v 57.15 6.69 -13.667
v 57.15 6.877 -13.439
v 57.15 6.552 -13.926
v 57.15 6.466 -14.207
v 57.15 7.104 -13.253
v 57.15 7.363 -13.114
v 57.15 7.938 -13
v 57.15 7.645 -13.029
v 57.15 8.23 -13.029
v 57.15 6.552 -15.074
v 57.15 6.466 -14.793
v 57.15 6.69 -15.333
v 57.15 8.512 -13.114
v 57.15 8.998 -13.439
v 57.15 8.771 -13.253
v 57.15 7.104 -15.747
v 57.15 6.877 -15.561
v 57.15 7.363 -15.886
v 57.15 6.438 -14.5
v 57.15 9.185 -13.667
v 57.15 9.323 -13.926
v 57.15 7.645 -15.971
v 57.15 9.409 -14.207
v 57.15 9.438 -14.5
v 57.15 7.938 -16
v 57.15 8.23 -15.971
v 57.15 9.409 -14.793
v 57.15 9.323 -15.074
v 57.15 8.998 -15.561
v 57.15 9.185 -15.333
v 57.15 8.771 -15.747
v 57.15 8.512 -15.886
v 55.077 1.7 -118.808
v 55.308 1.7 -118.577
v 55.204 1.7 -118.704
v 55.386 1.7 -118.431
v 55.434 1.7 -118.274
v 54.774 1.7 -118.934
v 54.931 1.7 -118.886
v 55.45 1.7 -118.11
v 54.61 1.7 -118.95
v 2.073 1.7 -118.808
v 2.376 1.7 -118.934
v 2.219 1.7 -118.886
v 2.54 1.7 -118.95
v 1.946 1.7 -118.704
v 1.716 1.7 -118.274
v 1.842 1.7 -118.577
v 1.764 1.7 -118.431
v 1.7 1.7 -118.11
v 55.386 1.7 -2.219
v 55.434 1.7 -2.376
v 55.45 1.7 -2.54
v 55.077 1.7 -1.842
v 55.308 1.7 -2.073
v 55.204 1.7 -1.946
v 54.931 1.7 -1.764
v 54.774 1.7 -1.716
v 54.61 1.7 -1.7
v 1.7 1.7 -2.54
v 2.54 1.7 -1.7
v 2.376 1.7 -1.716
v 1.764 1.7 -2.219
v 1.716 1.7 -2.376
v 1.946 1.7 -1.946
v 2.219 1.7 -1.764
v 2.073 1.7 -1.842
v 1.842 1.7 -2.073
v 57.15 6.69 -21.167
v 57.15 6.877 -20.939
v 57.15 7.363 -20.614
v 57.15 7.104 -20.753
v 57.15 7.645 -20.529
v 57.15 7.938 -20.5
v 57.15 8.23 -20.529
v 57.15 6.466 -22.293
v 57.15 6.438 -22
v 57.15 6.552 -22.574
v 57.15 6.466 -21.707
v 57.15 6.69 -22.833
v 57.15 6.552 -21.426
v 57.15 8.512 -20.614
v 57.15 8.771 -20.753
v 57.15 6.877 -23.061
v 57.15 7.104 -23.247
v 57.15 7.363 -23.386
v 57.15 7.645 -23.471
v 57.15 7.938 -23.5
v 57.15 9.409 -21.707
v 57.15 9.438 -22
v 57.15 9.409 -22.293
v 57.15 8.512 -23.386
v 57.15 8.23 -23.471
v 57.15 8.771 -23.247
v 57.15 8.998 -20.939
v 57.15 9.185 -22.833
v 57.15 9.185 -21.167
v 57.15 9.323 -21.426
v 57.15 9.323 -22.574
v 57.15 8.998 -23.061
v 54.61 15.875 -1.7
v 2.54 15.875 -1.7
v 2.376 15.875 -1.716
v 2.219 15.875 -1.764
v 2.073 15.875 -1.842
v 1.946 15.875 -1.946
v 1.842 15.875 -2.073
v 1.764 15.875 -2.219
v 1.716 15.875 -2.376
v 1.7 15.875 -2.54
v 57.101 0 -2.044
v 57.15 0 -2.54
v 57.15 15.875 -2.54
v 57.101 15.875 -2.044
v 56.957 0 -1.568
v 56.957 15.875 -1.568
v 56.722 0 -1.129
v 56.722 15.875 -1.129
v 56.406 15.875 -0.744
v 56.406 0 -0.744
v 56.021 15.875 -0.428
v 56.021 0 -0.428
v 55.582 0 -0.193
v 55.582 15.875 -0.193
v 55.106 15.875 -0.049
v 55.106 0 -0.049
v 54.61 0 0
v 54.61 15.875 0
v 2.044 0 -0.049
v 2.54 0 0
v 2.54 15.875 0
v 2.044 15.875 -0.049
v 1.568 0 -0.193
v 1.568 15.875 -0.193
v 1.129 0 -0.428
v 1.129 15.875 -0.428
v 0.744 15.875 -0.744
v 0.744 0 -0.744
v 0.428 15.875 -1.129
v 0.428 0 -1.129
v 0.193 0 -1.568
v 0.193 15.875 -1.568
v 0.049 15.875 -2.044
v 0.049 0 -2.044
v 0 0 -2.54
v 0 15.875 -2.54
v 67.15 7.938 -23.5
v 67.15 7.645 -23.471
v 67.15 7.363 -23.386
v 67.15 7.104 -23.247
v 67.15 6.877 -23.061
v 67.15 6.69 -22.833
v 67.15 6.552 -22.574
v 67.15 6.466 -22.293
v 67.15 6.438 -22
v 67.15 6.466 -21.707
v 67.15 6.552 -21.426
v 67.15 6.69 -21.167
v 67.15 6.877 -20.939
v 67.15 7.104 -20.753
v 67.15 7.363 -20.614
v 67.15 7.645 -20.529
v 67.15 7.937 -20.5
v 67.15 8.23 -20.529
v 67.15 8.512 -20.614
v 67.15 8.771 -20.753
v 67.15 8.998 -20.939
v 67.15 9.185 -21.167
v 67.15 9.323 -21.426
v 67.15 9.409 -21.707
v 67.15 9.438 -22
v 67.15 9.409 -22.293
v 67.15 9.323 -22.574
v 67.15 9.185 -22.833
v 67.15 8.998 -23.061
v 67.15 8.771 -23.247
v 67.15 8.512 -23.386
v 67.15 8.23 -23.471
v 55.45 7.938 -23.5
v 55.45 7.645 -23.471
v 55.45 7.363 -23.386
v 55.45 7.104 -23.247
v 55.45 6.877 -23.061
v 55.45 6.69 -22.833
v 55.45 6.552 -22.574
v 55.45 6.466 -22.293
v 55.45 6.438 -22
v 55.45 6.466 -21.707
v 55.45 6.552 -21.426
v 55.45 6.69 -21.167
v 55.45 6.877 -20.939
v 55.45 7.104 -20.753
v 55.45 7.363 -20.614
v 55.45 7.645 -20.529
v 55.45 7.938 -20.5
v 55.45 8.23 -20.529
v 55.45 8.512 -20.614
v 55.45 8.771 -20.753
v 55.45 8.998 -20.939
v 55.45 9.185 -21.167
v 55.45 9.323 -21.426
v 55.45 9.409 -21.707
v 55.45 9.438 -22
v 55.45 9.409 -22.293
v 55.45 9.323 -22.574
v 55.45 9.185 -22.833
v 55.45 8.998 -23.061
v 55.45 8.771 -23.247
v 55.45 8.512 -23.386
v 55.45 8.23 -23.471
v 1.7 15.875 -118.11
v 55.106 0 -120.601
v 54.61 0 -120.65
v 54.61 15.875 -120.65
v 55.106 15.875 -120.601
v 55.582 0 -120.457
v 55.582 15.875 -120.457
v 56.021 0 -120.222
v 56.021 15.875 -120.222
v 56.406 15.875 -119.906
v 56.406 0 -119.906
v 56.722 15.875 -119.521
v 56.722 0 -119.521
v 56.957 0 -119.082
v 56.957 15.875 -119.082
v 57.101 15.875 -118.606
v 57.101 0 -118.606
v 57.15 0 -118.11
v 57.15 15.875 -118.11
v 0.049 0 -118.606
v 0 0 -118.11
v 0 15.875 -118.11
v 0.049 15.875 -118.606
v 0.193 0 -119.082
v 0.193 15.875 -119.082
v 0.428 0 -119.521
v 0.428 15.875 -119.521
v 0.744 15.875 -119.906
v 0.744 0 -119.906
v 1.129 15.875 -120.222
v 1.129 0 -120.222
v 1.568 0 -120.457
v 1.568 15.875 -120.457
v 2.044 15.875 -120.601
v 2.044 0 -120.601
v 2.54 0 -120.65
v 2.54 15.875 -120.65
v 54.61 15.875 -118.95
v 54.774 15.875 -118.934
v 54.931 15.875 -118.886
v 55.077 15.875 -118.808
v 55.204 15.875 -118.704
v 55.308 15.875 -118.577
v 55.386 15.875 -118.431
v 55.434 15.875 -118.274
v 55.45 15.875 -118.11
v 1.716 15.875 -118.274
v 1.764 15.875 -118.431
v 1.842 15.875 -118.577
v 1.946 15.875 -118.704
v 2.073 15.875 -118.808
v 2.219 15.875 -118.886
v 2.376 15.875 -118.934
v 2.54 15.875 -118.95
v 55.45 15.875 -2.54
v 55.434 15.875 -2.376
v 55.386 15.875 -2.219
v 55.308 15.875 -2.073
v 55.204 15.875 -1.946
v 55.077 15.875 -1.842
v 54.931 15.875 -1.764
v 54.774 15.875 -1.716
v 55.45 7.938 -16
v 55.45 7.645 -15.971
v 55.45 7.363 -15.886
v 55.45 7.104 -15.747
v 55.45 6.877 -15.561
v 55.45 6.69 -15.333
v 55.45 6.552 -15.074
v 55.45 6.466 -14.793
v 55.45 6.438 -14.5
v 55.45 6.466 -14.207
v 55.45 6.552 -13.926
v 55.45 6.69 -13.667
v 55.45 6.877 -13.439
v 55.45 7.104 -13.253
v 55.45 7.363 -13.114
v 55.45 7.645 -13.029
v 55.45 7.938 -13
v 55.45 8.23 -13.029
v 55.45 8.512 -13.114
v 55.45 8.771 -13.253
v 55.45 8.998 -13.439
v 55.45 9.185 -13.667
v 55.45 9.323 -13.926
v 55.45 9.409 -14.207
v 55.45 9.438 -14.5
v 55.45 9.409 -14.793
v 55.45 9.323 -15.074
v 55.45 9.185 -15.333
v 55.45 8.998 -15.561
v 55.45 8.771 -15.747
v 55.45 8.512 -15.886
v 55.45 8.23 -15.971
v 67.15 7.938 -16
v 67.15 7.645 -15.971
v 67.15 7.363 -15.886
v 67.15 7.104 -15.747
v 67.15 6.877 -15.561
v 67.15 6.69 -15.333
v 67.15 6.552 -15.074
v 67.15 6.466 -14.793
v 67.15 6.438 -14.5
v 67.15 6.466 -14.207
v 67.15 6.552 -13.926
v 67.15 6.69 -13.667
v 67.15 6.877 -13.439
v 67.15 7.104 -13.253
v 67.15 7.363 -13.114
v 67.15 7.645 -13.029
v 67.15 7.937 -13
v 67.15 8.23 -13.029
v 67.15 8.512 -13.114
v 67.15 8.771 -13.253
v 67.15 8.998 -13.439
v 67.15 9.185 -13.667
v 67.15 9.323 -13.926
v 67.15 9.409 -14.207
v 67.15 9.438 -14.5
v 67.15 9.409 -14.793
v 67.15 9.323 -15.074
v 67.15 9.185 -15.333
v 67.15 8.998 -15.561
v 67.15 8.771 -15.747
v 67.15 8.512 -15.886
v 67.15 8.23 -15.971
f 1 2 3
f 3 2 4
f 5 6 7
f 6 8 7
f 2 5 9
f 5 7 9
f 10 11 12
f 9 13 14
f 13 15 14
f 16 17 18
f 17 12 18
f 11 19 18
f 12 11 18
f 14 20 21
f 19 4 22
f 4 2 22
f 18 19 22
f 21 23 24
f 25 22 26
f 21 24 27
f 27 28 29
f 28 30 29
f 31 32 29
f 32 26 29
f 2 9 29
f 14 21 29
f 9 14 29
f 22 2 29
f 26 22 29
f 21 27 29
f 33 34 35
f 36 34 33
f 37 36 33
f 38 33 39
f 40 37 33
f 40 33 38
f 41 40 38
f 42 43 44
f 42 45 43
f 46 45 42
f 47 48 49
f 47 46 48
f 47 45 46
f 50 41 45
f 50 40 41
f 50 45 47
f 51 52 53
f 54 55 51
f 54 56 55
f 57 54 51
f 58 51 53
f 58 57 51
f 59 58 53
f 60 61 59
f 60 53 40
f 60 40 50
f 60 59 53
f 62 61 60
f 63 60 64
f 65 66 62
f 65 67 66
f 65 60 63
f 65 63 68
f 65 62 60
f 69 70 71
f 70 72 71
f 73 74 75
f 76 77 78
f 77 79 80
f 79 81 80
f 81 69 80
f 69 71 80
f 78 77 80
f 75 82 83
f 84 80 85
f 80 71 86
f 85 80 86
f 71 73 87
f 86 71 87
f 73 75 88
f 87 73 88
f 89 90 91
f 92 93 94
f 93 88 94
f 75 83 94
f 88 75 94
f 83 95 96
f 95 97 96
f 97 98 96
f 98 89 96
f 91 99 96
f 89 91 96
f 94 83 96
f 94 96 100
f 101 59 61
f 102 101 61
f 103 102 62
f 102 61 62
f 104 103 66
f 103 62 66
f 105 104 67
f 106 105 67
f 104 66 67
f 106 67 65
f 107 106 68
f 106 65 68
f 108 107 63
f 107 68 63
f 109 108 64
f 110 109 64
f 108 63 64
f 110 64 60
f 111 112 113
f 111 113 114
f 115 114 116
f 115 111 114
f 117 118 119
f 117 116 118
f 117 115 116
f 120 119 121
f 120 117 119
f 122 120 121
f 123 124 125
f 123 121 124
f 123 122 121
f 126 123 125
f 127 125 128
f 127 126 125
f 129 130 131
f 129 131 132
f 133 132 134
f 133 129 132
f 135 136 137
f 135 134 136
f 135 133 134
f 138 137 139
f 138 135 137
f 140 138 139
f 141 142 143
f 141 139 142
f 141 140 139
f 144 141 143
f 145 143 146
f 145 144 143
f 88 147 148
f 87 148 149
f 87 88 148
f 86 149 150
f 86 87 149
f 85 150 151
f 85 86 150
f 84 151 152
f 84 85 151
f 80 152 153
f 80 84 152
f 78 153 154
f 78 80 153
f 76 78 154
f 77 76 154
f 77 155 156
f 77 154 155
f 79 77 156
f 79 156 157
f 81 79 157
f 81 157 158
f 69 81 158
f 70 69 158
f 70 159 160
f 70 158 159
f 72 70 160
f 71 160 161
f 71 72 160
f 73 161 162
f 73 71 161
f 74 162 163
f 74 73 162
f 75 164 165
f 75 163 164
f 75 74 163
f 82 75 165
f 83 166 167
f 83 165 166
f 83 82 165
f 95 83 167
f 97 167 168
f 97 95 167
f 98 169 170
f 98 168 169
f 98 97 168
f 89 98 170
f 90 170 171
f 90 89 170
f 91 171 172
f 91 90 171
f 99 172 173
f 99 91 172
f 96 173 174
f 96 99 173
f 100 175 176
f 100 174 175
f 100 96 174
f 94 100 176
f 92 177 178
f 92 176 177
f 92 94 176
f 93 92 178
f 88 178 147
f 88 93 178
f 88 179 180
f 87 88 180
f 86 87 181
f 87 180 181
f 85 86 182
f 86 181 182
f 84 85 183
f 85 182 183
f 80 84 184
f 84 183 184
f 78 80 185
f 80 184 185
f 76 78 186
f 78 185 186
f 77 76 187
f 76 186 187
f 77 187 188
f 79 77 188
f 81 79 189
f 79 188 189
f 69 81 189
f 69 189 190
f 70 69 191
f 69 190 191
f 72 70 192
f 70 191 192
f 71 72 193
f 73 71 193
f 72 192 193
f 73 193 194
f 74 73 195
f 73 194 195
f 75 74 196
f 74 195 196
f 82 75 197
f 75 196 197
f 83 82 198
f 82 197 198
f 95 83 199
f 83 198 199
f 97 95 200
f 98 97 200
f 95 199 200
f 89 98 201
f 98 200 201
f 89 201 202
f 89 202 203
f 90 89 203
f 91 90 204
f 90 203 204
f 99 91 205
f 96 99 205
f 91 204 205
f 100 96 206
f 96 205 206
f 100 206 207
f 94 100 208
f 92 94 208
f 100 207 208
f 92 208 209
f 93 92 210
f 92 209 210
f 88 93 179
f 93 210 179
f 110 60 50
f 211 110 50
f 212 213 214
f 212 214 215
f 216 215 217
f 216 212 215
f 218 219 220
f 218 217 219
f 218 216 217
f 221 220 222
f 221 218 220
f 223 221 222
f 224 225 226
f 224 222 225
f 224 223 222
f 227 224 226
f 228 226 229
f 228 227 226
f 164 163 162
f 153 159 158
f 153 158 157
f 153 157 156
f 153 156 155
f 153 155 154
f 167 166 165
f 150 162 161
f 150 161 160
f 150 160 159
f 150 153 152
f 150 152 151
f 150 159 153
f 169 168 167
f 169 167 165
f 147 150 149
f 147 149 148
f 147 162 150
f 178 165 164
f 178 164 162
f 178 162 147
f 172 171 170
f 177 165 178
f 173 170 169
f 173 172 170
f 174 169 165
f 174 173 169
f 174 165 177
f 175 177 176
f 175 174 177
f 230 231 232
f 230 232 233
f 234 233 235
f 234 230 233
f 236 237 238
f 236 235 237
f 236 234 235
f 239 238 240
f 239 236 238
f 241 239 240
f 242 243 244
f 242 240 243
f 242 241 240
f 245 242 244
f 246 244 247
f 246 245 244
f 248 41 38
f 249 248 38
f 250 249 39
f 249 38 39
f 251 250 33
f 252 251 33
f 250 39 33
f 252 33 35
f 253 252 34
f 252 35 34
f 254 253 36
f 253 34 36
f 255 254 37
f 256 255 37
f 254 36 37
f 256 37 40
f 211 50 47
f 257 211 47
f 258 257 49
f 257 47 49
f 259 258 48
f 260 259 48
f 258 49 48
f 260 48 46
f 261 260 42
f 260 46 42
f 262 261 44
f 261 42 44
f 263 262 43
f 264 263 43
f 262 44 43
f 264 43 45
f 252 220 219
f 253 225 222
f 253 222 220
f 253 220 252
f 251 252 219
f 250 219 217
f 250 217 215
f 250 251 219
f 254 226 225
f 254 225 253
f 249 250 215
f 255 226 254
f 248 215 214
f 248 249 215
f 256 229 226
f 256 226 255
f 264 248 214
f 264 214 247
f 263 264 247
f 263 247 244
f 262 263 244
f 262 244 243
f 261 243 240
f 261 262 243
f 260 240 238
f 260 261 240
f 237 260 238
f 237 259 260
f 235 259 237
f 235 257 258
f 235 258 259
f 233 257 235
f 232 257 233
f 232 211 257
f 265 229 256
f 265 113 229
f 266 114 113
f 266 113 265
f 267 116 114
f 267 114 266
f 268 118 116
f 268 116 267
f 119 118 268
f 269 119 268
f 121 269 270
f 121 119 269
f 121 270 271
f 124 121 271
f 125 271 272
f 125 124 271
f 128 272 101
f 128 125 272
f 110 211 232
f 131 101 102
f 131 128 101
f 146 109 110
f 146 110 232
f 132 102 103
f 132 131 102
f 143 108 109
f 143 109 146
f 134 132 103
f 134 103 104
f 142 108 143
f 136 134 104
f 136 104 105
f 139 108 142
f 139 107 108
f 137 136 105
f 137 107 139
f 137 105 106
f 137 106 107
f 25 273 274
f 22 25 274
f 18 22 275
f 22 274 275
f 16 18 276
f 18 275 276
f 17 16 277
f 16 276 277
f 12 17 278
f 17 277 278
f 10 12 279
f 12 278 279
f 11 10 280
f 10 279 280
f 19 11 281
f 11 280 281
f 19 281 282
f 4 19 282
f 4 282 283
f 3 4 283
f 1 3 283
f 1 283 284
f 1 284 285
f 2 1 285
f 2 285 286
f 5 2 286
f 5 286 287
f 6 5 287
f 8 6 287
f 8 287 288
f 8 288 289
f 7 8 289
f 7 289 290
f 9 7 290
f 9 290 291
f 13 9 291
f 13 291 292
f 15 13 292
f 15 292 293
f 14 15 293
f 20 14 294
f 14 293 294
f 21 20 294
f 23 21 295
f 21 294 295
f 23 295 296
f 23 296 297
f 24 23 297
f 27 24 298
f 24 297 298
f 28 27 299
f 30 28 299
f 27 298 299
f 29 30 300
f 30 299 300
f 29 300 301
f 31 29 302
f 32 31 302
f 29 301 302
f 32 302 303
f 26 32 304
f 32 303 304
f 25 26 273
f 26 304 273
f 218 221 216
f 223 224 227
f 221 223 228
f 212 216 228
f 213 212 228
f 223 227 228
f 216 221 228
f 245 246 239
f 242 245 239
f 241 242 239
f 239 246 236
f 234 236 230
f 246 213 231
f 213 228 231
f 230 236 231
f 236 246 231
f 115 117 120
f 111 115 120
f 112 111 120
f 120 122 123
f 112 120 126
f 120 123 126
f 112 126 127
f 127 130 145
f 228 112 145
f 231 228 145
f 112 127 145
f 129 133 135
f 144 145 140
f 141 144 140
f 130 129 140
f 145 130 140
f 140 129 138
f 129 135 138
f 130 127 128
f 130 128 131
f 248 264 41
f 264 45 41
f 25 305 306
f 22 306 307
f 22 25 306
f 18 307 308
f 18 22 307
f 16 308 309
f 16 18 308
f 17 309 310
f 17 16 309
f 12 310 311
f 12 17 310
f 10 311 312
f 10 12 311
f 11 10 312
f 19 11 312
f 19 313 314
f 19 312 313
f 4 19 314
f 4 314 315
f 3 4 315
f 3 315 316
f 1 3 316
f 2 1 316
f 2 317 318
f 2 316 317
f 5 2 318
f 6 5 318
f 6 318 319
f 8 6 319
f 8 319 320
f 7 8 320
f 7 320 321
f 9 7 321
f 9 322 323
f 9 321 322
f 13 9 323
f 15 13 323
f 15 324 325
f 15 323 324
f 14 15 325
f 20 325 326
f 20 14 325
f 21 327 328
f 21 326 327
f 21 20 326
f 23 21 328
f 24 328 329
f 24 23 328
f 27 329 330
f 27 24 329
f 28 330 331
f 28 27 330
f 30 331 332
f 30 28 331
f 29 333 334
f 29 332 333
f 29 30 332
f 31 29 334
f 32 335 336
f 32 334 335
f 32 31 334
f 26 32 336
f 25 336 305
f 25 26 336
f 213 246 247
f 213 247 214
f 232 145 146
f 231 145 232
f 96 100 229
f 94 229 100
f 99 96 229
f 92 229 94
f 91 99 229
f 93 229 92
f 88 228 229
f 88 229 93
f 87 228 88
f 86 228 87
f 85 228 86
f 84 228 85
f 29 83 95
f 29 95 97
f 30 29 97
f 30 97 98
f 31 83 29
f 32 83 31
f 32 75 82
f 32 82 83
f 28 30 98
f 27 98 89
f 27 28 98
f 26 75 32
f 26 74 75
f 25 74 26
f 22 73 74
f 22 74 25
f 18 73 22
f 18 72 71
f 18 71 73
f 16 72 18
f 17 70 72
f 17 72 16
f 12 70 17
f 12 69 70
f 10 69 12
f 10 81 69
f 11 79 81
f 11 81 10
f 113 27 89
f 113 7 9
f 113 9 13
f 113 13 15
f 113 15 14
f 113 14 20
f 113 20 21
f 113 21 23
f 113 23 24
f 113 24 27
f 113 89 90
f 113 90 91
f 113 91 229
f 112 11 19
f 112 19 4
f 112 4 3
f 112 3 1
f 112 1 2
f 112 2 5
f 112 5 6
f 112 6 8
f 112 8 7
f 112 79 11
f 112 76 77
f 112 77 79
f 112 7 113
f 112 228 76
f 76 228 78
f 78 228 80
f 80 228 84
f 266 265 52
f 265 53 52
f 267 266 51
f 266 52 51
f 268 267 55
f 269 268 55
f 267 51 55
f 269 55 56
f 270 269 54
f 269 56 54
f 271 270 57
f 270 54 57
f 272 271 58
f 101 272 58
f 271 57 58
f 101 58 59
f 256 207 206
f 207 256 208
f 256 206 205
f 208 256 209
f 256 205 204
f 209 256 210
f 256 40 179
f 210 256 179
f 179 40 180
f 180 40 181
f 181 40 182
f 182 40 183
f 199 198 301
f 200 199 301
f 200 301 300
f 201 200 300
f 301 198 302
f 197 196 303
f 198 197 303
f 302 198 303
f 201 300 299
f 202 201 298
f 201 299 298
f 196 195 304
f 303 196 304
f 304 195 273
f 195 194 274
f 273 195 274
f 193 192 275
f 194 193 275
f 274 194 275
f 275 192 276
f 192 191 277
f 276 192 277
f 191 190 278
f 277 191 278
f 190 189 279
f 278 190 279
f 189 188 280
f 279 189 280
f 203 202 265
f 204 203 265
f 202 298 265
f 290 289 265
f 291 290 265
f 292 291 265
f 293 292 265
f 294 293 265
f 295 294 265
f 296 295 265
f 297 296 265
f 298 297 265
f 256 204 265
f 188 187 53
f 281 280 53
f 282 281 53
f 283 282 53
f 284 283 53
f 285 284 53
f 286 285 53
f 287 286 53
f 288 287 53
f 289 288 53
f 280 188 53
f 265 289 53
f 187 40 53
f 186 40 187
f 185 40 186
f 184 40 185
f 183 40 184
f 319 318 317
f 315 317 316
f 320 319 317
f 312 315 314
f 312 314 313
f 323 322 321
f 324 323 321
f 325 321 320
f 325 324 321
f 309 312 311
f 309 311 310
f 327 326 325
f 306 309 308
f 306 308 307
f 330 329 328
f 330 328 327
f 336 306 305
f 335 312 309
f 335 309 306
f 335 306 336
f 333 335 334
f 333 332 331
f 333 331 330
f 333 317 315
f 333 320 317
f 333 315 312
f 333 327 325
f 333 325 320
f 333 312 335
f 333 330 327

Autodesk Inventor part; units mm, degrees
ref_plane "YZ Plane" through (0, 0, 0) normal (1, 0, 0) x (0, 1, 0)
ref_plane "XZ Plane" through (0, 0, 0) normal (0, 1, 0) x (-1, 0, 0)
ref_plane "XY Plane" through (0, 0, 0) normal (0, 0, 1) x (1, 0, 0)
sketch "Sketch1" plane through (0, 0, 0) normal (0, 1, 0) x (-1, 0, 0)
  line L0 (-57.15, -118.11) -> (-57.15, -2.54)
  arc A0 (-57.15, -118.11) -> (-54.61, -120.65) centre (-54.61, -118.11) ccw
  line L1 (-2.54, -120.65) -> (-54.61, -120.65)
  arc A1 (-2.54, -120.65) -> (0, -118.11) centre (-2.54, -118.11) ccw
  line L2 (0, -2.54) -> (0, -118.11)
  arc A2 (0, -2.54) -> (-2.54, 0) centre (-2.54, -2.54) ccw
  line L3 (-54.61, 0) -> (-2.54, 0)
  arc A3 (-54.61, 0) -> (-57.15, -2.54) centre (-54.61, -2.54) ccw
  point P0 (0, 0)
  point P1 (0, 0)
extrude "Extrusion1" add sketch "Sketch1" along normal blind 15.875
shell "Shell1" thickness 1.7 removed faces 1 at (38.1, 15.875, -41.0633)
sketch "Sketch2" plane through (57.15, 0, -2.54) normal (1, 0, 0) x (0, 0, -1)
  line L0 (0, 0) -> (115.57, 0) projected
  line L1 (115.57, 0) -> (115.57, 15.875) projected
  line L2 (0, 15.875) -> (115.57, 15.875) projected
  line L3 (0, 0) -> (0, 15.875) projected
  line L4 (118.11, 0) -> (118.11, 15.875) projected
  line L5 (-2.54, 0) -> (-2.54, 15.875) projected
  point P0 (11.96, 7.9375)
  point P1 (19.46, 7.9375)
  point P2 (0, 7.9375)
  dimension "d12" = 14.5
  dimension "d13" = 7.5
hole "Hole2" at (57.15, 7.9375, -14.5) at (57.15, 7.9375, -22) direction (-1, 0, 0) diameter 3 end up to surface
sketch "Sketch4" plane through (57.15, 0, -2.54) normal (1, 0, 0) x (0, 0, -1)
  circle A0 centre (11.96, 7.9375) radius 1.5 projected
  circle A1 centre (19.46, 7.9375) radius 1.5 projected
  line L0 (0, 0) -> (115.57, 0) projected
  line L1 (115.57, 0) -> (115.57, 15.875) projected
  line L2 (0, 15.875) -> (115.57, 15.875) projected
  line L3 (0, 0) -> (0, 15.875) projected
  point P0 (-2.54, 0)
extrude "Extrusion2" add sketch "Sketch4" along normal blind 10 contours A0 | A1
properties part number "739136_Holder" material "Polystyrene, High Impact"
